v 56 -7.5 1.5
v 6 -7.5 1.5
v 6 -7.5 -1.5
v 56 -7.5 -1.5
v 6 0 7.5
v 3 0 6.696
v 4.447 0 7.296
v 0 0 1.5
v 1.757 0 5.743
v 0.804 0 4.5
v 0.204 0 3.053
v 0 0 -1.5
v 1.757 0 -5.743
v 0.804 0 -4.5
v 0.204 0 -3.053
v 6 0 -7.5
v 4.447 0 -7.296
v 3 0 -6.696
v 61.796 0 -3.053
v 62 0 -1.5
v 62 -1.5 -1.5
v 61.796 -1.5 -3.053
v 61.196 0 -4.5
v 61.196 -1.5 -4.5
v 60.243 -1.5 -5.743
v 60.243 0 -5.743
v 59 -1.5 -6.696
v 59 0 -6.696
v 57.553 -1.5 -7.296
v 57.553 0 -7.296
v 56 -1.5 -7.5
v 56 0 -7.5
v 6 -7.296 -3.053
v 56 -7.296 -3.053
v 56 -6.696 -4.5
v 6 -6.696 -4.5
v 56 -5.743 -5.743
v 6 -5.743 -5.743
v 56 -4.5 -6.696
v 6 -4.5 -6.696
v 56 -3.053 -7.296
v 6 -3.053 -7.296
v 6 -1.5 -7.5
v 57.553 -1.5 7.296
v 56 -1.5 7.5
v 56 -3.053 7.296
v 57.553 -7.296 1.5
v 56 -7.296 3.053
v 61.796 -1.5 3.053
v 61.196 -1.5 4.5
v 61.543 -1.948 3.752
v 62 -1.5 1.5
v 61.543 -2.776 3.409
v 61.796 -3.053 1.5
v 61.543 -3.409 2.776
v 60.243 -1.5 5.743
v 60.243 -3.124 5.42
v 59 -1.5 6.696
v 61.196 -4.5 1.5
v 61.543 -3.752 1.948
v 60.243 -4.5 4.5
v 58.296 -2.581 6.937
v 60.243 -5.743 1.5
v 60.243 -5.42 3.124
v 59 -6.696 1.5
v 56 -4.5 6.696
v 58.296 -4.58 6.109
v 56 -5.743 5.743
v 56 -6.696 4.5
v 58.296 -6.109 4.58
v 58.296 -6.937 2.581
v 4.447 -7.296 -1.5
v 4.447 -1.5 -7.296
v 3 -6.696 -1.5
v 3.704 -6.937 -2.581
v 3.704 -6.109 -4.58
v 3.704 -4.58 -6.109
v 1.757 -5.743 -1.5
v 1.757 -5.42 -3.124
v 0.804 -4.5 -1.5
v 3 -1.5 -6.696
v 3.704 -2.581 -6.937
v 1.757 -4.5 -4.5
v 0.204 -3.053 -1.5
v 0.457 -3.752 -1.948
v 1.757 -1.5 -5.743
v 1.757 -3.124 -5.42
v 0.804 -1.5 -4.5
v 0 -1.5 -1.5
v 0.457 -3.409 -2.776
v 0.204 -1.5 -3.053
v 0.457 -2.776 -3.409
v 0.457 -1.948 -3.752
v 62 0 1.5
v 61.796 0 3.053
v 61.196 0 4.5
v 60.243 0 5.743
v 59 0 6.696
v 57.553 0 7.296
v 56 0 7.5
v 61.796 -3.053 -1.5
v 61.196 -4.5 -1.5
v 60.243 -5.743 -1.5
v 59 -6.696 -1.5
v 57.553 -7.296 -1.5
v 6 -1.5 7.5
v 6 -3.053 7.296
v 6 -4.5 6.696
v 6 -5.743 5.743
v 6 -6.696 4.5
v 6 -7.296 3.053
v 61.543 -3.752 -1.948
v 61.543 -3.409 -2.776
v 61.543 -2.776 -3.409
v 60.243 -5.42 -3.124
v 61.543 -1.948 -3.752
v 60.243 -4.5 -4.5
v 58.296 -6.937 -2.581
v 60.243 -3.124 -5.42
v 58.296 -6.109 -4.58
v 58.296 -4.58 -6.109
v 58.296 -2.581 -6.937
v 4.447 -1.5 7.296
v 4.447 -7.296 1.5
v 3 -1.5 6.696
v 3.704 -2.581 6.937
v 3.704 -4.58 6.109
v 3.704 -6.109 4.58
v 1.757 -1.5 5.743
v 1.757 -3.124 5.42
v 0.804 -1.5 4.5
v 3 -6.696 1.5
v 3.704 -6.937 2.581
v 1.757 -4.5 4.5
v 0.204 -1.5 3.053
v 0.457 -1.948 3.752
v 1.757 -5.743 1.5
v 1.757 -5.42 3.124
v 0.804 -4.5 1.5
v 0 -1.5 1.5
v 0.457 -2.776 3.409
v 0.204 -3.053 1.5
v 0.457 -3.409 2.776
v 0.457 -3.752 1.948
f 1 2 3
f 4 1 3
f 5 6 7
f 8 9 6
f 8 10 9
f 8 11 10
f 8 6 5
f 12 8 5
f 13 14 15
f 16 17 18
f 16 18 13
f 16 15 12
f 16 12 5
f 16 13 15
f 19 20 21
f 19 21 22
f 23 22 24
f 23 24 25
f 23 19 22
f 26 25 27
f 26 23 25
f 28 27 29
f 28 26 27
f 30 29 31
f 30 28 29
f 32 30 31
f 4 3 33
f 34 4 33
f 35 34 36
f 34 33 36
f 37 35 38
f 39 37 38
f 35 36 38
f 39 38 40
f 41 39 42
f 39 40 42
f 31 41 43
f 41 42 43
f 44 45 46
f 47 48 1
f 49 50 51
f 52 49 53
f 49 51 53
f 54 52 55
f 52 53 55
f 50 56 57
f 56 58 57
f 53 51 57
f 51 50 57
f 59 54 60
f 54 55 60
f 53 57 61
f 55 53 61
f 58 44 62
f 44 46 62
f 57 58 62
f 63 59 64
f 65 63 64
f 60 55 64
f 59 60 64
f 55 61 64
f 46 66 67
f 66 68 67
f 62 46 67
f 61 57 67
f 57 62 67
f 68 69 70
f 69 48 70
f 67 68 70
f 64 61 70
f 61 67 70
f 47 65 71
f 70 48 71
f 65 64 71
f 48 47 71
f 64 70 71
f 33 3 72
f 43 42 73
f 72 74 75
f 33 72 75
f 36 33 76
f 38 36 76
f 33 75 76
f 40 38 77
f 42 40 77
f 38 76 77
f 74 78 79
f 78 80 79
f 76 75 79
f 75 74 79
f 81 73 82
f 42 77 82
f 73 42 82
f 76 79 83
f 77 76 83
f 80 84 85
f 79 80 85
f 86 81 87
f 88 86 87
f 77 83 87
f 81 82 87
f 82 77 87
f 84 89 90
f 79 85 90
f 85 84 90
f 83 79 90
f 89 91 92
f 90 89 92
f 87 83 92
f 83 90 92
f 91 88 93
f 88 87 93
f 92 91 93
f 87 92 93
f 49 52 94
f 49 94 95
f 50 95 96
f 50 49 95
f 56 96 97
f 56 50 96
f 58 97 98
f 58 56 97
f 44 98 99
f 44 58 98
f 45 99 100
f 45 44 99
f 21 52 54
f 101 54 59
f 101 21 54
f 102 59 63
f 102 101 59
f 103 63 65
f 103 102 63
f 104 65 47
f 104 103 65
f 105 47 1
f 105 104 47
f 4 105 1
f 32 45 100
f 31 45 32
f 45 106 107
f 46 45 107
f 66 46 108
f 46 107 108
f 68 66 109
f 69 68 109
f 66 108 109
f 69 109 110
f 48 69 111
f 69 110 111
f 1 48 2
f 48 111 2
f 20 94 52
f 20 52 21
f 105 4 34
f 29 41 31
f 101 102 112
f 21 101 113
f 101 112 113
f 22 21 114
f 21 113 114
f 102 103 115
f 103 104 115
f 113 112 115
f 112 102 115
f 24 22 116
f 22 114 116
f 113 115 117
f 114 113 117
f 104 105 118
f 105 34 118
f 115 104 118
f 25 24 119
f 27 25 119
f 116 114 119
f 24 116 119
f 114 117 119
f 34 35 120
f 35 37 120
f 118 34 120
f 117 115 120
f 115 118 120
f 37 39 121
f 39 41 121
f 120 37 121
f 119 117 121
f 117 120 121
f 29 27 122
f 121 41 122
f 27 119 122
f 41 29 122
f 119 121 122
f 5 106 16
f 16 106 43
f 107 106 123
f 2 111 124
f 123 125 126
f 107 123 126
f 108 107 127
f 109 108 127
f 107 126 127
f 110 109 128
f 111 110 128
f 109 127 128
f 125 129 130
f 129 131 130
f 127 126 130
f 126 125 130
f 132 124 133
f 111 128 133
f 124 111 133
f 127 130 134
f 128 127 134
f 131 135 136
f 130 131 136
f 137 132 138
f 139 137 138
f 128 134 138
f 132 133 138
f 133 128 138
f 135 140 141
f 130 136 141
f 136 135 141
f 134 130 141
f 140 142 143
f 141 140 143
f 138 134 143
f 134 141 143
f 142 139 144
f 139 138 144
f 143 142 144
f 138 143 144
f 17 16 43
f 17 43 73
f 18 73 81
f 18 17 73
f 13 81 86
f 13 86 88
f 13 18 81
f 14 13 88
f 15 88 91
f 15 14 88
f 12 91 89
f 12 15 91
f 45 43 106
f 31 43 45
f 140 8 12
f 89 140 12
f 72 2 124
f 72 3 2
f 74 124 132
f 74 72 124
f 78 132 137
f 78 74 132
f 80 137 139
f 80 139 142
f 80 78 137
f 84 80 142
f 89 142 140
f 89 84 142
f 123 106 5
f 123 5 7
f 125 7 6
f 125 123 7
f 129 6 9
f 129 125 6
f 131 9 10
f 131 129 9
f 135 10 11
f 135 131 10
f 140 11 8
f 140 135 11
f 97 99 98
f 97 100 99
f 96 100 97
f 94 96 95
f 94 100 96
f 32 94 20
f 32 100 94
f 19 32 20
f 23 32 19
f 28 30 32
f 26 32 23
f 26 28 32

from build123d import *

# Parameters (mm, degrees)
BOSS_EXTRUDE1_DEPTH = 62
FILLET1_R           = 6
FILLET2_R           = 6
CAVITY1_START       = -1.5
CAVITY1_OUTLINE_W   = 50
CAVITY1_OUTLINE_H   = 15
CAVITY1_DEPTH       = 3
SKETCH2_W           = 132.712401986
SKETCH2_H           = 25.545070458
CUT_EXTRUDE1_DEPTH  = 10


# Read off the part's stored shape, not the designer's step: Cavity1
with BuildPart() as part:
    # Sketch1 → Boss-Extrude1 (new body)
    with BuildSketch(Plane(origin=(0, 0, 0), x_dir=(0, 0, -1), z_dir=(1, 0, 0))):
        with BuildLine():
            Line((-1.5, -7.5), (1.5, -7.5))
            ThreePointArc((1.5, -7.5), (5.742640687, -5.742640687), (7.5, -1.5))
            Line((7.5, -1.5), (7.5, 1.5))
            ThreePointArc((7.5, 1.5), (5.742640687, 5.742640687), (1.5, 7.5))
            Line((1.5, 7.5), (-1.5, 7.5))
            ThreePointArc((-1.5, 7.5), (-5.742640687, 5.742640687), (-7.5, 1.5))
            Line((-7.5, 1.5), (-7.5, -1.5))
            ThreePointArc((-7.5, -1.5), (-5.742640687, -5.742640687), (-1.5, -7.5))
        make_face()
    extrude(amount=BOSS_EXTRUDE1_DEPTH)

    # Fillet1
    fillet1_edges = [part.edges().sort_by_distance(p)[0] for p in [
        (0, 7.5, 0),
        (0, 5.742640687, -5.742640687),
        (0, 0, -7.5),
        (0, -5.742640687, -5.742640687),
        (0, -7.5, 0),
        (0, -5.742640687, 5.742640687),
        (0, 0, 7.5),
        (0, 5.742640687, 5.742640687),
    ]]
    fillet(fillet1_edges, radius=FILLET1_R)

    # Fillet2
    fillet2_edges = [part.edges().sort_by_distance(p)[0] for p in [
        (62, 5.742640687, -5.742640687),
        (62, 7.5, 0),
        (62, 5.742640687, 5.742640687),
        (62, 0, 7.5),
        (62, -5.742640687, 5.742640687),
        (62, -7.5, 0),
        (62, -5.742640687, -5.742640687),
        (62, 0, -7.5),
    ]]
    fillet(fillet2_edges, radius=FILLET2_R)

    # Cavity1 outline → Cavity1 (cut)
    with BuildSketch(Plane(origin=(0, 0, 0), x_dir=(1, 0, 0), z_dir=(0, 1, 0)).offset(CAVITY1_START)):
        with Locations((31, 0)):
            Rectangle(CAVITY1_OUTLINE_W, CAVITY1_OUTLINE_H)
    extrude(amount=CAVITY1_DEPTH, mode=Mode.SUBTRACT)

    # Sketch2 → Cut-Extrude1 (cut)
    with BuildSketch(Plane(origin=(0, 0, 0), x_dir=(1, 0, 0), z_dir=(0, 1, 0))):
        Rectangle(SKETCH2_W, SKETCH2_H)
    extrude(amount=CUT_EXTRUDE1_DEPTH, mode=Mode.SUBTRACT)


solid = part.part
